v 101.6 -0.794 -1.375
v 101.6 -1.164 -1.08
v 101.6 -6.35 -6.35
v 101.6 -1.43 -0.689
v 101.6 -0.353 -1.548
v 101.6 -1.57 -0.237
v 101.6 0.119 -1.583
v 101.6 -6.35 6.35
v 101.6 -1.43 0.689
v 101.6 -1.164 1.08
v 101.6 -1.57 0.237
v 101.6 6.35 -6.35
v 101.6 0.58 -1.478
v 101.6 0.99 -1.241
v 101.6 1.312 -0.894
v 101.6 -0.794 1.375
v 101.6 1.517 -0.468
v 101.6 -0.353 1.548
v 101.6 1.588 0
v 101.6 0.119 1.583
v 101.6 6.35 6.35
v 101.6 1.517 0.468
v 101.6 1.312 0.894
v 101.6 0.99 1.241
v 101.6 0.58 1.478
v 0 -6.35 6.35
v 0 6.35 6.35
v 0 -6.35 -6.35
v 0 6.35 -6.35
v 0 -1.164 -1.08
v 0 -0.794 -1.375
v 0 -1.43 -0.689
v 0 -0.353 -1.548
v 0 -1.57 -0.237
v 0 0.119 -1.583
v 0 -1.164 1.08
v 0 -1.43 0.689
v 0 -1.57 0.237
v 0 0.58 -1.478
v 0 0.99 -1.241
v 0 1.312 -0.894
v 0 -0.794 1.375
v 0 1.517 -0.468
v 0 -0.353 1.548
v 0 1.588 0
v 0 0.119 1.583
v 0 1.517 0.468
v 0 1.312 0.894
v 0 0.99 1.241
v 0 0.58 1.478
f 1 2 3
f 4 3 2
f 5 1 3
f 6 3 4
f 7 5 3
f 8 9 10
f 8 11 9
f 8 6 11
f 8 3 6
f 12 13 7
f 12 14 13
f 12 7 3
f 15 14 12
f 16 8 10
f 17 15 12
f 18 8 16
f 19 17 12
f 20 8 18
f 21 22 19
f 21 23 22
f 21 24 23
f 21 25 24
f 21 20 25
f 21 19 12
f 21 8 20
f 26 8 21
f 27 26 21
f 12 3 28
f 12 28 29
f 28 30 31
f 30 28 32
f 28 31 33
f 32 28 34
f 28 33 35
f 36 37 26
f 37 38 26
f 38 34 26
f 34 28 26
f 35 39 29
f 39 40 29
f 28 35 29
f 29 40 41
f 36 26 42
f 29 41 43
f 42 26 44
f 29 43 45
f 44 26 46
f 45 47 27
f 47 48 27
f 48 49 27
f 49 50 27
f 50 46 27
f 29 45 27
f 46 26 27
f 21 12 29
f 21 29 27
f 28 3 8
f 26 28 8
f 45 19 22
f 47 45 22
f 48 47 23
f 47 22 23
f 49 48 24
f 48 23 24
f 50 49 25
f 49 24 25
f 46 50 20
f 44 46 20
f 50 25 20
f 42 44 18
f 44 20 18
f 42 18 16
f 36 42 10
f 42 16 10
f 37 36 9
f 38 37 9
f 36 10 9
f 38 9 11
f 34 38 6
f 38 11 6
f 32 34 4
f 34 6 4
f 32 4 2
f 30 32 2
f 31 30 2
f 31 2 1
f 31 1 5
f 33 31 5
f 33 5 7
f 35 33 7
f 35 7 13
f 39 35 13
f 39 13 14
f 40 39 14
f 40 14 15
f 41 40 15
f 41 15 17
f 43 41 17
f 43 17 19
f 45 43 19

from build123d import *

# Parameters (mm, degrees)
F0_W     = 12.7
F0_H     = 12.7
F1_DEPTH = 101.6
F2_R     = 1.5875
F3_DEPTH = 114.554


with BuildPart() as f1:
    # F0 (on Right) → F1 (new body)
    with BuildSketch(Plane.YZ):
        Rectangle(F0_W, F0_H)
    extrude(amount=F1_DEPTH)

    # F2 (on face) → F3 (cut)
    with BuildSketch(Plane.YZ.offset(101.6)):
        Circle(F2_R)
    extrude(amount=-F3_DEPTH, mode=Mode.SUBTRACT)


solid = f1.part
